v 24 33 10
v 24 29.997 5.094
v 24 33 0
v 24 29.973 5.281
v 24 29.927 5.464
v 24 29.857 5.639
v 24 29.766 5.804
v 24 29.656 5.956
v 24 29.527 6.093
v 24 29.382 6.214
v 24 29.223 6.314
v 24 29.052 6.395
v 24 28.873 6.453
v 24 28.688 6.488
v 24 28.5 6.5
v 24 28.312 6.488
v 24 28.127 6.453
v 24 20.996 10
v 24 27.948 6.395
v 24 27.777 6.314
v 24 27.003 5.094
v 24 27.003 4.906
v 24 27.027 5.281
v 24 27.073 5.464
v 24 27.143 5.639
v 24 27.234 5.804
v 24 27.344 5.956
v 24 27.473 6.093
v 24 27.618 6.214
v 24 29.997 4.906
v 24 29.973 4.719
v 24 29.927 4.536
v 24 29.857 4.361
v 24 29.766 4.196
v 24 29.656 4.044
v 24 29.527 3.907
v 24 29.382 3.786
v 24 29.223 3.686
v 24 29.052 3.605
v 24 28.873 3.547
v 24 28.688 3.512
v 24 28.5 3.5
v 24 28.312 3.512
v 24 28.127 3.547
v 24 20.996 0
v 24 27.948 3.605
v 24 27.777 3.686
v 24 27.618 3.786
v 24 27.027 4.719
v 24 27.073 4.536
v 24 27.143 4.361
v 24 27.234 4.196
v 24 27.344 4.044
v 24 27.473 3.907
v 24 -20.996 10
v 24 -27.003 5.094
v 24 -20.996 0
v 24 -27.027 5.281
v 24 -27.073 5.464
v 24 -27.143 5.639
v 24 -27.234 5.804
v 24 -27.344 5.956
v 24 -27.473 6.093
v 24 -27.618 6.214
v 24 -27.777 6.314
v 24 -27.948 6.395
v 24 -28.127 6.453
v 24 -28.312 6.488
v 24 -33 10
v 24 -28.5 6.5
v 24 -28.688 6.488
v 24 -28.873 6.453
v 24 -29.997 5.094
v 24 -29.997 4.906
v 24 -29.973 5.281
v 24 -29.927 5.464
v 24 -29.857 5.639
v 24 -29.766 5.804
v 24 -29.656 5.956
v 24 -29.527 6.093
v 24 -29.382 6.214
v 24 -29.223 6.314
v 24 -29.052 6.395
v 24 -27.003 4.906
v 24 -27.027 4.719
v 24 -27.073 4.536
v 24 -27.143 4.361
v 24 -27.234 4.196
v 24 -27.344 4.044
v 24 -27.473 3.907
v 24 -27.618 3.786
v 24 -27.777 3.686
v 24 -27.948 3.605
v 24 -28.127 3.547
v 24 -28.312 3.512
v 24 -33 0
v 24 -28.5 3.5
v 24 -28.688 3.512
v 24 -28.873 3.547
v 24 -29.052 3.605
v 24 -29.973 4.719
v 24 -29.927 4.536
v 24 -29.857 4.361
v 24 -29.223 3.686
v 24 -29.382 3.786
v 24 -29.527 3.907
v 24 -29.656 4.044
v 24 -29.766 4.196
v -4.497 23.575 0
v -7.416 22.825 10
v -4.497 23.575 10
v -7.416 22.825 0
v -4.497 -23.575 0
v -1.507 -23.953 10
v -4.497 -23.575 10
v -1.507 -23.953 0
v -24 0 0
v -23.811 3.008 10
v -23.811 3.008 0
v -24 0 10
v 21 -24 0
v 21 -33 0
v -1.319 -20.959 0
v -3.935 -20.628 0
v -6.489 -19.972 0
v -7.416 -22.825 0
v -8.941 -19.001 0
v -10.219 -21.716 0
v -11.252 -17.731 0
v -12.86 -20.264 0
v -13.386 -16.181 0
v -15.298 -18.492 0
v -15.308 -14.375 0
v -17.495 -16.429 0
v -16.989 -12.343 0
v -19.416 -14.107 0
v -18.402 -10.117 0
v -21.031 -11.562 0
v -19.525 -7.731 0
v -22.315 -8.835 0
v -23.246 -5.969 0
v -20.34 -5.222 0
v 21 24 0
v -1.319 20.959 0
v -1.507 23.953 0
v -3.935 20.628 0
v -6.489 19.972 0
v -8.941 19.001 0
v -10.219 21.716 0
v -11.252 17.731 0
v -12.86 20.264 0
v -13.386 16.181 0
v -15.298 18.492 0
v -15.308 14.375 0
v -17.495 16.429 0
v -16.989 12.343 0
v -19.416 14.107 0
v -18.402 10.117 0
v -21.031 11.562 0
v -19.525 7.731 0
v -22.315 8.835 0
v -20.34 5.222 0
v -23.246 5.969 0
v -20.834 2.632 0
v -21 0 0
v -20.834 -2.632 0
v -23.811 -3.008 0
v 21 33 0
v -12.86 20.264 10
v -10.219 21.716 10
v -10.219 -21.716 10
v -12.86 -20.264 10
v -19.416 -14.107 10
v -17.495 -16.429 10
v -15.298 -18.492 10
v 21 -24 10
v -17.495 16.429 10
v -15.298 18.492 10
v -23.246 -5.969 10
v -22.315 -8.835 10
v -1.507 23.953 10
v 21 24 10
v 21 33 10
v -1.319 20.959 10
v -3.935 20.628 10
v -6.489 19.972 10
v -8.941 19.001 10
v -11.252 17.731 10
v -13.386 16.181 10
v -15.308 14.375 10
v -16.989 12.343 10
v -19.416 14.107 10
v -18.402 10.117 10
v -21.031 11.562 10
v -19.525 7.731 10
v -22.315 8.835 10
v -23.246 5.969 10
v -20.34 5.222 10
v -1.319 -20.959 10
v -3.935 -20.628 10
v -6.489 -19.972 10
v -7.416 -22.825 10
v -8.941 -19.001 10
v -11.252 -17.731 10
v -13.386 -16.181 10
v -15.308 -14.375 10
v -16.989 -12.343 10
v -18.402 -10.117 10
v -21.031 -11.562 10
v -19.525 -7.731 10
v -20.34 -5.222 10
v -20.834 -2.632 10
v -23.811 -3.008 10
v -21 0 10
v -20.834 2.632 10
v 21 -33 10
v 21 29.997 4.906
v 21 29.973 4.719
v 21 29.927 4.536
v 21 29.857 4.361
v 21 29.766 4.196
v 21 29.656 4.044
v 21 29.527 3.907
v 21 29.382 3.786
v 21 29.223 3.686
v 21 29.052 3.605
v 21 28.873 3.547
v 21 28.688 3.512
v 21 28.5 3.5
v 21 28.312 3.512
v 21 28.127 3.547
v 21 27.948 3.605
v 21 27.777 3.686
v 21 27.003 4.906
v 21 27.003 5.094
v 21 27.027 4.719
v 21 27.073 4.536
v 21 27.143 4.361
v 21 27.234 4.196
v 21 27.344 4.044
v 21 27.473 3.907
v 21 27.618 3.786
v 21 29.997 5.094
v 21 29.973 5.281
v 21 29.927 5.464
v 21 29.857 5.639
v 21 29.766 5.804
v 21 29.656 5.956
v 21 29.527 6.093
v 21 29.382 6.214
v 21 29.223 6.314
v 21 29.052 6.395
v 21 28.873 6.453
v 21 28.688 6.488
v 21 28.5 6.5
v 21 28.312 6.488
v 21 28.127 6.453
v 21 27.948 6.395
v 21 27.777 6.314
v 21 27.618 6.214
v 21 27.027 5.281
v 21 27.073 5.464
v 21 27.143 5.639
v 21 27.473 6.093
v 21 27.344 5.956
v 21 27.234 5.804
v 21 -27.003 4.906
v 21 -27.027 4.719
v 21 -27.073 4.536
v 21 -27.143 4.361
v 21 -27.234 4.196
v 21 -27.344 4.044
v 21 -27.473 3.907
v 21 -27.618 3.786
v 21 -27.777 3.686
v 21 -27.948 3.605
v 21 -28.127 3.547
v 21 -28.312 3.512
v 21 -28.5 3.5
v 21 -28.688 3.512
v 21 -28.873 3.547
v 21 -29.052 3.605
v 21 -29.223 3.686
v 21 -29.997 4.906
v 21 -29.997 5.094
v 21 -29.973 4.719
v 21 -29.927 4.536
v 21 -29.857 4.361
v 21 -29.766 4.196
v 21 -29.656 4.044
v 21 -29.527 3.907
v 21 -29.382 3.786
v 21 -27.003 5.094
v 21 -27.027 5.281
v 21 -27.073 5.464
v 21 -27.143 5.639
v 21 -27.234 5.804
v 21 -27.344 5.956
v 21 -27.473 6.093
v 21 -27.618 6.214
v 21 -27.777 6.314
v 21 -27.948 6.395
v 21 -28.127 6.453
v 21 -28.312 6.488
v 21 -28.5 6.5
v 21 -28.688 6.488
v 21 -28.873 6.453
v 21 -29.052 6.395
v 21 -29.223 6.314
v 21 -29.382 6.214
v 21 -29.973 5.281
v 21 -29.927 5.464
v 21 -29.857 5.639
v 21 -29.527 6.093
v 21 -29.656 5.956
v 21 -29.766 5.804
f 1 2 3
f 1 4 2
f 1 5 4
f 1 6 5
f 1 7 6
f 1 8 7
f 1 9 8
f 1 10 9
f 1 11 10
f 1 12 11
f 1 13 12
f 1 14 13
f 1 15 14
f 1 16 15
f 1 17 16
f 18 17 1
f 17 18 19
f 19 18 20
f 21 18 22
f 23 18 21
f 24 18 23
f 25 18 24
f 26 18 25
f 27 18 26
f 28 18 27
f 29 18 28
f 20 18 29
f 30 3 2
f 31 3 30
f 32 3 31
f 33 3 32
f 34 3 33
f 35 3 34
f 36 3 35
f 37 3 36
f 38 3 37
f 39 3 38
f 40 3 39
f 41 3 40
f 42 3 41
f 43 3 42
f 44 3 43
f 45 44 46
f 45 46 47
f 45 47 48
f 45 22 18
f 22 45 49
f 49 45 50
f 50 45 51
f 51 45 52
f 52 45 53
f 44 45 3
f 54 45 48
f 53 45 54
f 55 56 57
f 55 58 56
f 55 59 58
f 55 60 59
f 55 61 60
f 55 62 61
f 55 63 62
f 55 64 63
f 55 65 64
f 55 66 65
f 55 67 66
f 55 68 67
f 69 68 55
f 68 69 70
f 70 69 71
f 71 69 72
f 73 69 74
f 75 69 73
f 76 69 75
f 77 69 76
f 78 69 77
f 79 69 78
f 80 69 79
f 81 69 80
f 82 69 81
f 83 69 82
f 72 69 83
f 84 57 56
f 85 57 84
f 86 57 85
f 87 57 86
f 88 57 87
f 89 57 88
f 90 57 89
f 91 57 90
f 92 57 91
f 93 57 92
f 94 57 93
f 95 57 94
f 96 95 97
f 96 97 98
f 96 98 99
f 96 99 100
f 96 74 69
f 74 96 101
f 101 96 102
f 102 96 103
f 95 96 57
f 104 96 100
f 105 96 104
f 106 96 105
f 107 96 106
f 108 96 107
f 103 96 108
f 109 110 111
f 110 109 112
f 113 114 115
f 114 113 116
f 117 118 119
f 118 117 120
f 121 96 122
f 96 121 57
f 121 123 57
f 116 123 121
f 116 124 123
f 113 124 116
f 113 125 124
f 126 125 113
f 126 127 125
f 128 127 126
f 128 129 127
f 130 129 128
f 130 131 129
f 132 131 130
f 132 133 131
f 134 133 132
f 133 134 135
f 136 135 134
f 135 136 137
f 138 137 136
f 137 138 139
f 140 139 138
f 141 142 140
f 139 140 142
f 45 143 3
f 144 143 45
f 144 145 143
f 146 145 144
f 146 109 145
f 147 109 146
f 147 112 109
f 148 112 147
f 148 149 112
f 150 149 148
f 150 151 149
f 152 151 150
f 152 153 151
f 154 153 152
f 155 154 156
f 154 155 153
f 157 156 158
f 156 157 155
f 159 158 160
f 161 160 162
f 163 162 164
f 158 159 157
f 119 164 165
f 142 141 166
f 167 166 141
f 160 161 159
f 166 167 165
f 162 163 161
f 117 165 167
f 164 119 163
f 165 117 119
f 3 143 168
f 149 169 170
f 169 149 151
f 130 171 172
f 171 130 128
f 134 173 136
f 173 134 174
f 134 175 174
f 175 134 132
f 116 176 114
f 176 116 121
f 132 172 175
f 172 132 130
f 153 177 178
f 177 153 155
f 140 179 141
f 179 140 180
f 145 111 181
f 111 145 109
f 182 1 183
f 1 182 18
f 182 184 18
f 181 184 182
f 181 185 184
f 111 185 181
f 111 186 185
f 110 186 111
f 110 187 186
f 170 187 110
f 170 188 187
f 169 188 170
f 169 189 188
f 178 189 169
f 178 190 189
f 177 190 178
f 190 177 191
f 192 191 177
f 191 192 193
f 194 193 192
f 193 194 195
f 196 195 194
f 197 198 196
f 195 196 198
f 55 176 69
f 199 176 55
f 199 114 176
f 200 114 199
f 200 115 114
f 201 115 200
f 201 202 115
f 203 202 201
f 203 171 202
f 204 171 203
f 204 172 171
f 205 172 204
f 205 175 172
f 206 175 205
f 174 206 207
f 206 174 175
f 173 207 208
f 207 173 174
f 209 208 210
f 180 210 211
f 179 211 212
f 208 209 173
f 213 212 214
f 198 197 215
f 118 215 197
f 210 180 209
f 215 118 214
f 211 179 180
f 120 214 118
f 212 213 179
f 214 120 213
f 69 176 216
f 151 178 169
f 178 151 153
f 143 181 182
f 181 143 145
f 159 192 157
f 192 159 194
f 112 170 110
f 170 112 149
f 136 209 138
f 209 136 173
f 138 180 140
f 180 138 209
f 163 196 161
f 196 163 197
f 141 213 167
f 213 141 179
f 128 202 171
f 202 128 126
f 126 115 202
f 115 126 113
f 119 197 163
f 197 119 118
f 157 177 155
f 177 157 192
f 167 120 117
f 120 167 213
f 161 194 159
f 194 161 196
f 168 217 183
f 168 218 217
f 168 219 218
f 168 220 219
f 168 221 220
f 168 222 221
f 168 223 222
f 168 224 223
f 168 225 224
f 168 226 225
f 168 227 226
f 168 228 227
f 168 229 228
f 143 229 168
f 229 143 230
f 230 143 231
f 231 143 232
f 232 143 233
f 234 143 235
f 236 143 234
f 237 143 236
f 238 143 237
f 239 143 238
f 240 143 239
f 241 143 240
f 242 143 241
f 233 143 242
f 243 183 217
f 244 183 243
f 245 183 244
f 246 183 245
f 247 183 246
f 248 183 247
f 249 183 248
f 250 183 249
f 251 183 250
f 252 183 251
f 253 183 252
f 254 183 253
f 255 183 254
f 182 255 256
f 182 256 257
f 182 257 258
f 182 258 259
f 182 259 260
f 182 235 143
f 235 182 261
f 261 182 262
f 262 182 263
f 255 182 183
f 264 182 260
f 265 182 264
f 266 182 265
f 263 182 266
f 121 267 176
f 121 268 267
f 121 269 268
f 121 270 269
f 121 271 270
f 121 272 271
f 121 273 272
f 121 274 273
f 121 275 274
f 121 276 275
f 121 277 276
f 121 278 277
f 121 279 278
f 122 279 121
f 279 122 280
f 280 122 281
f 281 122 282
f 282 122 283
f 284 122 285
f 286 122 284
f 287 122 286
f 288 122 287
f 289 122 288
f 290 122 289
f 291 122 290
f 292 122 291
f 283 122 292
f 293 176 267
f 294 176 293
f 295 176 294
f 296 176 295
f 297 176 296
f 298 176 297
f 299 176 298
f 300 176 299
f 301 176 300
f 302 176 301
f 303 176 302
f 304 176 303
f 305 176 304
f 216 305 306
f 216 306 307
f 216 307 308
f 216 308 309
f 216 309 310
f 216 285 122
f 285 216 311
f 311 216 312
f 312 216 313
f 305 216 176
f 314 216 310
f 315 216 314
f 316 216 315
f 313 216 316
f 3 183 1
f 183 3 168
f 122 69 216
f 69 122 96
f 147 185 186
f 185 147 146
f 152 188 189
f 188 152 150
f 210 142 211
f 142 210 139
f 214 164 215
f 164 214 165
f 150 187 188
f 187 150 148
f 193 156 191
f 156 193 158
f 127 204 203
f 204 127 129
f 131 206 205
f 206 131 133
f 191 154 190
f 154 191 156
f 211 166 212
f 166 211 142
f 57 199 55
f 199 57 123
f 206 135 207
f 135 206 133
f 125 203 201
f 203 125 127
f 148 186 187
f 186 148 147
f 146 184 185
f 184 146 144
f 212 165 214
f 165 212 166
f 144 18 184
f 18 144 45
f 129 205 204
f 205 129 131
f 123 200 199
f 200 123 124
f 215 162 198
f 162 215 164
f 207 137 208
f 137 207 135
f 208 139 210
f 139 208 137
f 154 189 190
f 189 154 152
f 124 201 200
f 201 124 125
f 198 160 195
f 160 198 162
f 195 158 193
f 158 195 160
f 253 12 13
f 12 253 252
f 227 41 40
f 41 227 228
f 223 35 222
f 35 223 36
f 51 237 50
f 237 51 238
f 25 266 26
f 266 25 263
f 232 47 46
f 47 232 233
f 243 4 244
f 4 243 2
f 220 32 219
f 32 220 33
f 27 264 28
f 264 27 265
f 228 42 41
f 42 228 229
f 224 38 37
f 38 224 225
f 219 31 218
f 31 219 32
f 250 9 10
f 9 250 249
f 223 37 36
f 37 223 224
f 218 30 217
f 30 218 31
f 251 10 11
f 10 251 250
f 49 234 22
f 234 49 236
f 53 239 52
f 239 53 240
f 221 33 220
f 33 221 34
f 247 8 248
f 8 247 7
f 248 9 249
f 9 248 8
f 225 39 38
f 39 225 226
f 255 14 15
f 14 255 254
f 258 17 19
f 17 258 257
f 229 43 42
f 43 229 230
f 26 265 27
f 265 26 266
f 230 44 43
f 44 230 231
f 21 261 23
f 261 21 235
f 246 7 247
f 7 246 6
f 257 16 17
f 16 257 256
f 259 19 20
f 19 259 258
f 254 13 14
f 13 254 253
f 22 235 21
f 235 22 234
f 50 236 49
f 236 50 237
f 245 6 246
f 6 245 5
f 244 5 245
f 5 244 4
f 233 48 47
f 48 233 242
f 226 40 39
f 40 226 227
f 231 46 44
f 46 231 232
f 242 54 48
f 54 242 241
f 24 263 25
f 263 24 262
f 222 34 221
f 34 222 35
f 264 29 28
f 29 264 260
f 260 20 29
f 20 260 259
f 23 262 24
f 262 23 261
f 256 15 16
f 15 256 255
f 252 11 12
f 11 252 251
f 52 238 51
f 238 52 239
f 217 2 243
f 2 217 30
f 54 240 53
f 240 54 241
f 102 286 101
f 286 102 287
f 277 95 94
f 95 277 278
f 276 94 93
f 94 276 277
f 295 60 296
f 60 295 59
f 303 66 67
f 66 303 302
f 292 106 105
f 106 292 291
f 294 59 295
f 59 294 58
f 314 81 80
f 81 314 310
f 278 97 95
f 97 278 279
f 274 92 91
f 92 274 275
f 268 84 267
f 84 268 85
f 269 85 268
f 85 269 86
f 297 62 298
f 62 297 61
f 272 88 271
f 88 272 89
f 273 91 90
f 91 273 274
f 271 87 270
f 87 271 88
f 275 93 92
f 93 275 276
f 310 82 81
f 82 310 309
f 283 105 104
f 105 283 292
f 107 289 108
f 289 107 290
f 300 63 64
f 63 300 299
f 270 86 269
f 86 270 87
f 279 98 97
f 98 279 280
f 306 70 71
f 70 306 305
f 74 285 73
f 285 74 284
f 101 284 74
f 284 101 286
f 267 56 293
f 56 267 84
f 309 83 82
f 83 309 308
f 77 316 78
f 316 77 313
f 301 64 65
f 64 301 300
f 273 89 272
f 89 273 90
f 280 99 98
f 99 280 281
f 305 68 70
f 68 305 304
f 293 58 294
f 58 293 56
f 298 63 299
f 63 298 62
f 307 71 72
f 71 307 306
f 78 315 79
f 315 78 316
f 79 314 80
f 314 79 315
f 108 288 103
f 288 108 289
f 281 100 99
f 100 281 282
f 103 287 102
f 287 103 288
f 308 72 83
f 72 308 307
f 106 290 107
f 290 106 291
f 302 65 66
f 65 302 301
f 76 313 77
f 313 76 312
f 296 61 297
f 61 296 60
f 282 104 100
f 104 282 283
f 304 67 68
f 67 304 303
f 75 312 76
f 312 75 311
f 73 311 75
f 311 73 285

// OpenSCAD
$fn=50;
diameter=48;
thickness=3;

difference(){
    union(){
    hull(){
    cylinder(10,diameter/2,diameter/2);
    translate([(diameter/2)-thickness,-diameter/2,0]) cube([thickness,diameter,10]);
    }    
    translate([(diameter/2)-thickness,-(diameter+18)/2,0]) cube([thickness,diameter+18,10]);
    }
    hull(){
    translate([0,0,-1]) cylinder(20,(diameter/2)-thickness,(diameter/2)-thickness);
    translate([(diameter/2)+thickness,-(diameter/2)+thickness,0]) cube([thickness,((diameter/2)-thickness)*2,10]);
    }
    translate([0,((diameter/2)+(thickness)+(thickness/2)),5]) rotate([0,90,0]) cylinder(5000,1.5,1.5);
    translate([0,-((diameter/2)+(thickness)+(thickness/2)),5]) rotate([0,90,0]) cylinder(5000,1.5,1.5);
}
